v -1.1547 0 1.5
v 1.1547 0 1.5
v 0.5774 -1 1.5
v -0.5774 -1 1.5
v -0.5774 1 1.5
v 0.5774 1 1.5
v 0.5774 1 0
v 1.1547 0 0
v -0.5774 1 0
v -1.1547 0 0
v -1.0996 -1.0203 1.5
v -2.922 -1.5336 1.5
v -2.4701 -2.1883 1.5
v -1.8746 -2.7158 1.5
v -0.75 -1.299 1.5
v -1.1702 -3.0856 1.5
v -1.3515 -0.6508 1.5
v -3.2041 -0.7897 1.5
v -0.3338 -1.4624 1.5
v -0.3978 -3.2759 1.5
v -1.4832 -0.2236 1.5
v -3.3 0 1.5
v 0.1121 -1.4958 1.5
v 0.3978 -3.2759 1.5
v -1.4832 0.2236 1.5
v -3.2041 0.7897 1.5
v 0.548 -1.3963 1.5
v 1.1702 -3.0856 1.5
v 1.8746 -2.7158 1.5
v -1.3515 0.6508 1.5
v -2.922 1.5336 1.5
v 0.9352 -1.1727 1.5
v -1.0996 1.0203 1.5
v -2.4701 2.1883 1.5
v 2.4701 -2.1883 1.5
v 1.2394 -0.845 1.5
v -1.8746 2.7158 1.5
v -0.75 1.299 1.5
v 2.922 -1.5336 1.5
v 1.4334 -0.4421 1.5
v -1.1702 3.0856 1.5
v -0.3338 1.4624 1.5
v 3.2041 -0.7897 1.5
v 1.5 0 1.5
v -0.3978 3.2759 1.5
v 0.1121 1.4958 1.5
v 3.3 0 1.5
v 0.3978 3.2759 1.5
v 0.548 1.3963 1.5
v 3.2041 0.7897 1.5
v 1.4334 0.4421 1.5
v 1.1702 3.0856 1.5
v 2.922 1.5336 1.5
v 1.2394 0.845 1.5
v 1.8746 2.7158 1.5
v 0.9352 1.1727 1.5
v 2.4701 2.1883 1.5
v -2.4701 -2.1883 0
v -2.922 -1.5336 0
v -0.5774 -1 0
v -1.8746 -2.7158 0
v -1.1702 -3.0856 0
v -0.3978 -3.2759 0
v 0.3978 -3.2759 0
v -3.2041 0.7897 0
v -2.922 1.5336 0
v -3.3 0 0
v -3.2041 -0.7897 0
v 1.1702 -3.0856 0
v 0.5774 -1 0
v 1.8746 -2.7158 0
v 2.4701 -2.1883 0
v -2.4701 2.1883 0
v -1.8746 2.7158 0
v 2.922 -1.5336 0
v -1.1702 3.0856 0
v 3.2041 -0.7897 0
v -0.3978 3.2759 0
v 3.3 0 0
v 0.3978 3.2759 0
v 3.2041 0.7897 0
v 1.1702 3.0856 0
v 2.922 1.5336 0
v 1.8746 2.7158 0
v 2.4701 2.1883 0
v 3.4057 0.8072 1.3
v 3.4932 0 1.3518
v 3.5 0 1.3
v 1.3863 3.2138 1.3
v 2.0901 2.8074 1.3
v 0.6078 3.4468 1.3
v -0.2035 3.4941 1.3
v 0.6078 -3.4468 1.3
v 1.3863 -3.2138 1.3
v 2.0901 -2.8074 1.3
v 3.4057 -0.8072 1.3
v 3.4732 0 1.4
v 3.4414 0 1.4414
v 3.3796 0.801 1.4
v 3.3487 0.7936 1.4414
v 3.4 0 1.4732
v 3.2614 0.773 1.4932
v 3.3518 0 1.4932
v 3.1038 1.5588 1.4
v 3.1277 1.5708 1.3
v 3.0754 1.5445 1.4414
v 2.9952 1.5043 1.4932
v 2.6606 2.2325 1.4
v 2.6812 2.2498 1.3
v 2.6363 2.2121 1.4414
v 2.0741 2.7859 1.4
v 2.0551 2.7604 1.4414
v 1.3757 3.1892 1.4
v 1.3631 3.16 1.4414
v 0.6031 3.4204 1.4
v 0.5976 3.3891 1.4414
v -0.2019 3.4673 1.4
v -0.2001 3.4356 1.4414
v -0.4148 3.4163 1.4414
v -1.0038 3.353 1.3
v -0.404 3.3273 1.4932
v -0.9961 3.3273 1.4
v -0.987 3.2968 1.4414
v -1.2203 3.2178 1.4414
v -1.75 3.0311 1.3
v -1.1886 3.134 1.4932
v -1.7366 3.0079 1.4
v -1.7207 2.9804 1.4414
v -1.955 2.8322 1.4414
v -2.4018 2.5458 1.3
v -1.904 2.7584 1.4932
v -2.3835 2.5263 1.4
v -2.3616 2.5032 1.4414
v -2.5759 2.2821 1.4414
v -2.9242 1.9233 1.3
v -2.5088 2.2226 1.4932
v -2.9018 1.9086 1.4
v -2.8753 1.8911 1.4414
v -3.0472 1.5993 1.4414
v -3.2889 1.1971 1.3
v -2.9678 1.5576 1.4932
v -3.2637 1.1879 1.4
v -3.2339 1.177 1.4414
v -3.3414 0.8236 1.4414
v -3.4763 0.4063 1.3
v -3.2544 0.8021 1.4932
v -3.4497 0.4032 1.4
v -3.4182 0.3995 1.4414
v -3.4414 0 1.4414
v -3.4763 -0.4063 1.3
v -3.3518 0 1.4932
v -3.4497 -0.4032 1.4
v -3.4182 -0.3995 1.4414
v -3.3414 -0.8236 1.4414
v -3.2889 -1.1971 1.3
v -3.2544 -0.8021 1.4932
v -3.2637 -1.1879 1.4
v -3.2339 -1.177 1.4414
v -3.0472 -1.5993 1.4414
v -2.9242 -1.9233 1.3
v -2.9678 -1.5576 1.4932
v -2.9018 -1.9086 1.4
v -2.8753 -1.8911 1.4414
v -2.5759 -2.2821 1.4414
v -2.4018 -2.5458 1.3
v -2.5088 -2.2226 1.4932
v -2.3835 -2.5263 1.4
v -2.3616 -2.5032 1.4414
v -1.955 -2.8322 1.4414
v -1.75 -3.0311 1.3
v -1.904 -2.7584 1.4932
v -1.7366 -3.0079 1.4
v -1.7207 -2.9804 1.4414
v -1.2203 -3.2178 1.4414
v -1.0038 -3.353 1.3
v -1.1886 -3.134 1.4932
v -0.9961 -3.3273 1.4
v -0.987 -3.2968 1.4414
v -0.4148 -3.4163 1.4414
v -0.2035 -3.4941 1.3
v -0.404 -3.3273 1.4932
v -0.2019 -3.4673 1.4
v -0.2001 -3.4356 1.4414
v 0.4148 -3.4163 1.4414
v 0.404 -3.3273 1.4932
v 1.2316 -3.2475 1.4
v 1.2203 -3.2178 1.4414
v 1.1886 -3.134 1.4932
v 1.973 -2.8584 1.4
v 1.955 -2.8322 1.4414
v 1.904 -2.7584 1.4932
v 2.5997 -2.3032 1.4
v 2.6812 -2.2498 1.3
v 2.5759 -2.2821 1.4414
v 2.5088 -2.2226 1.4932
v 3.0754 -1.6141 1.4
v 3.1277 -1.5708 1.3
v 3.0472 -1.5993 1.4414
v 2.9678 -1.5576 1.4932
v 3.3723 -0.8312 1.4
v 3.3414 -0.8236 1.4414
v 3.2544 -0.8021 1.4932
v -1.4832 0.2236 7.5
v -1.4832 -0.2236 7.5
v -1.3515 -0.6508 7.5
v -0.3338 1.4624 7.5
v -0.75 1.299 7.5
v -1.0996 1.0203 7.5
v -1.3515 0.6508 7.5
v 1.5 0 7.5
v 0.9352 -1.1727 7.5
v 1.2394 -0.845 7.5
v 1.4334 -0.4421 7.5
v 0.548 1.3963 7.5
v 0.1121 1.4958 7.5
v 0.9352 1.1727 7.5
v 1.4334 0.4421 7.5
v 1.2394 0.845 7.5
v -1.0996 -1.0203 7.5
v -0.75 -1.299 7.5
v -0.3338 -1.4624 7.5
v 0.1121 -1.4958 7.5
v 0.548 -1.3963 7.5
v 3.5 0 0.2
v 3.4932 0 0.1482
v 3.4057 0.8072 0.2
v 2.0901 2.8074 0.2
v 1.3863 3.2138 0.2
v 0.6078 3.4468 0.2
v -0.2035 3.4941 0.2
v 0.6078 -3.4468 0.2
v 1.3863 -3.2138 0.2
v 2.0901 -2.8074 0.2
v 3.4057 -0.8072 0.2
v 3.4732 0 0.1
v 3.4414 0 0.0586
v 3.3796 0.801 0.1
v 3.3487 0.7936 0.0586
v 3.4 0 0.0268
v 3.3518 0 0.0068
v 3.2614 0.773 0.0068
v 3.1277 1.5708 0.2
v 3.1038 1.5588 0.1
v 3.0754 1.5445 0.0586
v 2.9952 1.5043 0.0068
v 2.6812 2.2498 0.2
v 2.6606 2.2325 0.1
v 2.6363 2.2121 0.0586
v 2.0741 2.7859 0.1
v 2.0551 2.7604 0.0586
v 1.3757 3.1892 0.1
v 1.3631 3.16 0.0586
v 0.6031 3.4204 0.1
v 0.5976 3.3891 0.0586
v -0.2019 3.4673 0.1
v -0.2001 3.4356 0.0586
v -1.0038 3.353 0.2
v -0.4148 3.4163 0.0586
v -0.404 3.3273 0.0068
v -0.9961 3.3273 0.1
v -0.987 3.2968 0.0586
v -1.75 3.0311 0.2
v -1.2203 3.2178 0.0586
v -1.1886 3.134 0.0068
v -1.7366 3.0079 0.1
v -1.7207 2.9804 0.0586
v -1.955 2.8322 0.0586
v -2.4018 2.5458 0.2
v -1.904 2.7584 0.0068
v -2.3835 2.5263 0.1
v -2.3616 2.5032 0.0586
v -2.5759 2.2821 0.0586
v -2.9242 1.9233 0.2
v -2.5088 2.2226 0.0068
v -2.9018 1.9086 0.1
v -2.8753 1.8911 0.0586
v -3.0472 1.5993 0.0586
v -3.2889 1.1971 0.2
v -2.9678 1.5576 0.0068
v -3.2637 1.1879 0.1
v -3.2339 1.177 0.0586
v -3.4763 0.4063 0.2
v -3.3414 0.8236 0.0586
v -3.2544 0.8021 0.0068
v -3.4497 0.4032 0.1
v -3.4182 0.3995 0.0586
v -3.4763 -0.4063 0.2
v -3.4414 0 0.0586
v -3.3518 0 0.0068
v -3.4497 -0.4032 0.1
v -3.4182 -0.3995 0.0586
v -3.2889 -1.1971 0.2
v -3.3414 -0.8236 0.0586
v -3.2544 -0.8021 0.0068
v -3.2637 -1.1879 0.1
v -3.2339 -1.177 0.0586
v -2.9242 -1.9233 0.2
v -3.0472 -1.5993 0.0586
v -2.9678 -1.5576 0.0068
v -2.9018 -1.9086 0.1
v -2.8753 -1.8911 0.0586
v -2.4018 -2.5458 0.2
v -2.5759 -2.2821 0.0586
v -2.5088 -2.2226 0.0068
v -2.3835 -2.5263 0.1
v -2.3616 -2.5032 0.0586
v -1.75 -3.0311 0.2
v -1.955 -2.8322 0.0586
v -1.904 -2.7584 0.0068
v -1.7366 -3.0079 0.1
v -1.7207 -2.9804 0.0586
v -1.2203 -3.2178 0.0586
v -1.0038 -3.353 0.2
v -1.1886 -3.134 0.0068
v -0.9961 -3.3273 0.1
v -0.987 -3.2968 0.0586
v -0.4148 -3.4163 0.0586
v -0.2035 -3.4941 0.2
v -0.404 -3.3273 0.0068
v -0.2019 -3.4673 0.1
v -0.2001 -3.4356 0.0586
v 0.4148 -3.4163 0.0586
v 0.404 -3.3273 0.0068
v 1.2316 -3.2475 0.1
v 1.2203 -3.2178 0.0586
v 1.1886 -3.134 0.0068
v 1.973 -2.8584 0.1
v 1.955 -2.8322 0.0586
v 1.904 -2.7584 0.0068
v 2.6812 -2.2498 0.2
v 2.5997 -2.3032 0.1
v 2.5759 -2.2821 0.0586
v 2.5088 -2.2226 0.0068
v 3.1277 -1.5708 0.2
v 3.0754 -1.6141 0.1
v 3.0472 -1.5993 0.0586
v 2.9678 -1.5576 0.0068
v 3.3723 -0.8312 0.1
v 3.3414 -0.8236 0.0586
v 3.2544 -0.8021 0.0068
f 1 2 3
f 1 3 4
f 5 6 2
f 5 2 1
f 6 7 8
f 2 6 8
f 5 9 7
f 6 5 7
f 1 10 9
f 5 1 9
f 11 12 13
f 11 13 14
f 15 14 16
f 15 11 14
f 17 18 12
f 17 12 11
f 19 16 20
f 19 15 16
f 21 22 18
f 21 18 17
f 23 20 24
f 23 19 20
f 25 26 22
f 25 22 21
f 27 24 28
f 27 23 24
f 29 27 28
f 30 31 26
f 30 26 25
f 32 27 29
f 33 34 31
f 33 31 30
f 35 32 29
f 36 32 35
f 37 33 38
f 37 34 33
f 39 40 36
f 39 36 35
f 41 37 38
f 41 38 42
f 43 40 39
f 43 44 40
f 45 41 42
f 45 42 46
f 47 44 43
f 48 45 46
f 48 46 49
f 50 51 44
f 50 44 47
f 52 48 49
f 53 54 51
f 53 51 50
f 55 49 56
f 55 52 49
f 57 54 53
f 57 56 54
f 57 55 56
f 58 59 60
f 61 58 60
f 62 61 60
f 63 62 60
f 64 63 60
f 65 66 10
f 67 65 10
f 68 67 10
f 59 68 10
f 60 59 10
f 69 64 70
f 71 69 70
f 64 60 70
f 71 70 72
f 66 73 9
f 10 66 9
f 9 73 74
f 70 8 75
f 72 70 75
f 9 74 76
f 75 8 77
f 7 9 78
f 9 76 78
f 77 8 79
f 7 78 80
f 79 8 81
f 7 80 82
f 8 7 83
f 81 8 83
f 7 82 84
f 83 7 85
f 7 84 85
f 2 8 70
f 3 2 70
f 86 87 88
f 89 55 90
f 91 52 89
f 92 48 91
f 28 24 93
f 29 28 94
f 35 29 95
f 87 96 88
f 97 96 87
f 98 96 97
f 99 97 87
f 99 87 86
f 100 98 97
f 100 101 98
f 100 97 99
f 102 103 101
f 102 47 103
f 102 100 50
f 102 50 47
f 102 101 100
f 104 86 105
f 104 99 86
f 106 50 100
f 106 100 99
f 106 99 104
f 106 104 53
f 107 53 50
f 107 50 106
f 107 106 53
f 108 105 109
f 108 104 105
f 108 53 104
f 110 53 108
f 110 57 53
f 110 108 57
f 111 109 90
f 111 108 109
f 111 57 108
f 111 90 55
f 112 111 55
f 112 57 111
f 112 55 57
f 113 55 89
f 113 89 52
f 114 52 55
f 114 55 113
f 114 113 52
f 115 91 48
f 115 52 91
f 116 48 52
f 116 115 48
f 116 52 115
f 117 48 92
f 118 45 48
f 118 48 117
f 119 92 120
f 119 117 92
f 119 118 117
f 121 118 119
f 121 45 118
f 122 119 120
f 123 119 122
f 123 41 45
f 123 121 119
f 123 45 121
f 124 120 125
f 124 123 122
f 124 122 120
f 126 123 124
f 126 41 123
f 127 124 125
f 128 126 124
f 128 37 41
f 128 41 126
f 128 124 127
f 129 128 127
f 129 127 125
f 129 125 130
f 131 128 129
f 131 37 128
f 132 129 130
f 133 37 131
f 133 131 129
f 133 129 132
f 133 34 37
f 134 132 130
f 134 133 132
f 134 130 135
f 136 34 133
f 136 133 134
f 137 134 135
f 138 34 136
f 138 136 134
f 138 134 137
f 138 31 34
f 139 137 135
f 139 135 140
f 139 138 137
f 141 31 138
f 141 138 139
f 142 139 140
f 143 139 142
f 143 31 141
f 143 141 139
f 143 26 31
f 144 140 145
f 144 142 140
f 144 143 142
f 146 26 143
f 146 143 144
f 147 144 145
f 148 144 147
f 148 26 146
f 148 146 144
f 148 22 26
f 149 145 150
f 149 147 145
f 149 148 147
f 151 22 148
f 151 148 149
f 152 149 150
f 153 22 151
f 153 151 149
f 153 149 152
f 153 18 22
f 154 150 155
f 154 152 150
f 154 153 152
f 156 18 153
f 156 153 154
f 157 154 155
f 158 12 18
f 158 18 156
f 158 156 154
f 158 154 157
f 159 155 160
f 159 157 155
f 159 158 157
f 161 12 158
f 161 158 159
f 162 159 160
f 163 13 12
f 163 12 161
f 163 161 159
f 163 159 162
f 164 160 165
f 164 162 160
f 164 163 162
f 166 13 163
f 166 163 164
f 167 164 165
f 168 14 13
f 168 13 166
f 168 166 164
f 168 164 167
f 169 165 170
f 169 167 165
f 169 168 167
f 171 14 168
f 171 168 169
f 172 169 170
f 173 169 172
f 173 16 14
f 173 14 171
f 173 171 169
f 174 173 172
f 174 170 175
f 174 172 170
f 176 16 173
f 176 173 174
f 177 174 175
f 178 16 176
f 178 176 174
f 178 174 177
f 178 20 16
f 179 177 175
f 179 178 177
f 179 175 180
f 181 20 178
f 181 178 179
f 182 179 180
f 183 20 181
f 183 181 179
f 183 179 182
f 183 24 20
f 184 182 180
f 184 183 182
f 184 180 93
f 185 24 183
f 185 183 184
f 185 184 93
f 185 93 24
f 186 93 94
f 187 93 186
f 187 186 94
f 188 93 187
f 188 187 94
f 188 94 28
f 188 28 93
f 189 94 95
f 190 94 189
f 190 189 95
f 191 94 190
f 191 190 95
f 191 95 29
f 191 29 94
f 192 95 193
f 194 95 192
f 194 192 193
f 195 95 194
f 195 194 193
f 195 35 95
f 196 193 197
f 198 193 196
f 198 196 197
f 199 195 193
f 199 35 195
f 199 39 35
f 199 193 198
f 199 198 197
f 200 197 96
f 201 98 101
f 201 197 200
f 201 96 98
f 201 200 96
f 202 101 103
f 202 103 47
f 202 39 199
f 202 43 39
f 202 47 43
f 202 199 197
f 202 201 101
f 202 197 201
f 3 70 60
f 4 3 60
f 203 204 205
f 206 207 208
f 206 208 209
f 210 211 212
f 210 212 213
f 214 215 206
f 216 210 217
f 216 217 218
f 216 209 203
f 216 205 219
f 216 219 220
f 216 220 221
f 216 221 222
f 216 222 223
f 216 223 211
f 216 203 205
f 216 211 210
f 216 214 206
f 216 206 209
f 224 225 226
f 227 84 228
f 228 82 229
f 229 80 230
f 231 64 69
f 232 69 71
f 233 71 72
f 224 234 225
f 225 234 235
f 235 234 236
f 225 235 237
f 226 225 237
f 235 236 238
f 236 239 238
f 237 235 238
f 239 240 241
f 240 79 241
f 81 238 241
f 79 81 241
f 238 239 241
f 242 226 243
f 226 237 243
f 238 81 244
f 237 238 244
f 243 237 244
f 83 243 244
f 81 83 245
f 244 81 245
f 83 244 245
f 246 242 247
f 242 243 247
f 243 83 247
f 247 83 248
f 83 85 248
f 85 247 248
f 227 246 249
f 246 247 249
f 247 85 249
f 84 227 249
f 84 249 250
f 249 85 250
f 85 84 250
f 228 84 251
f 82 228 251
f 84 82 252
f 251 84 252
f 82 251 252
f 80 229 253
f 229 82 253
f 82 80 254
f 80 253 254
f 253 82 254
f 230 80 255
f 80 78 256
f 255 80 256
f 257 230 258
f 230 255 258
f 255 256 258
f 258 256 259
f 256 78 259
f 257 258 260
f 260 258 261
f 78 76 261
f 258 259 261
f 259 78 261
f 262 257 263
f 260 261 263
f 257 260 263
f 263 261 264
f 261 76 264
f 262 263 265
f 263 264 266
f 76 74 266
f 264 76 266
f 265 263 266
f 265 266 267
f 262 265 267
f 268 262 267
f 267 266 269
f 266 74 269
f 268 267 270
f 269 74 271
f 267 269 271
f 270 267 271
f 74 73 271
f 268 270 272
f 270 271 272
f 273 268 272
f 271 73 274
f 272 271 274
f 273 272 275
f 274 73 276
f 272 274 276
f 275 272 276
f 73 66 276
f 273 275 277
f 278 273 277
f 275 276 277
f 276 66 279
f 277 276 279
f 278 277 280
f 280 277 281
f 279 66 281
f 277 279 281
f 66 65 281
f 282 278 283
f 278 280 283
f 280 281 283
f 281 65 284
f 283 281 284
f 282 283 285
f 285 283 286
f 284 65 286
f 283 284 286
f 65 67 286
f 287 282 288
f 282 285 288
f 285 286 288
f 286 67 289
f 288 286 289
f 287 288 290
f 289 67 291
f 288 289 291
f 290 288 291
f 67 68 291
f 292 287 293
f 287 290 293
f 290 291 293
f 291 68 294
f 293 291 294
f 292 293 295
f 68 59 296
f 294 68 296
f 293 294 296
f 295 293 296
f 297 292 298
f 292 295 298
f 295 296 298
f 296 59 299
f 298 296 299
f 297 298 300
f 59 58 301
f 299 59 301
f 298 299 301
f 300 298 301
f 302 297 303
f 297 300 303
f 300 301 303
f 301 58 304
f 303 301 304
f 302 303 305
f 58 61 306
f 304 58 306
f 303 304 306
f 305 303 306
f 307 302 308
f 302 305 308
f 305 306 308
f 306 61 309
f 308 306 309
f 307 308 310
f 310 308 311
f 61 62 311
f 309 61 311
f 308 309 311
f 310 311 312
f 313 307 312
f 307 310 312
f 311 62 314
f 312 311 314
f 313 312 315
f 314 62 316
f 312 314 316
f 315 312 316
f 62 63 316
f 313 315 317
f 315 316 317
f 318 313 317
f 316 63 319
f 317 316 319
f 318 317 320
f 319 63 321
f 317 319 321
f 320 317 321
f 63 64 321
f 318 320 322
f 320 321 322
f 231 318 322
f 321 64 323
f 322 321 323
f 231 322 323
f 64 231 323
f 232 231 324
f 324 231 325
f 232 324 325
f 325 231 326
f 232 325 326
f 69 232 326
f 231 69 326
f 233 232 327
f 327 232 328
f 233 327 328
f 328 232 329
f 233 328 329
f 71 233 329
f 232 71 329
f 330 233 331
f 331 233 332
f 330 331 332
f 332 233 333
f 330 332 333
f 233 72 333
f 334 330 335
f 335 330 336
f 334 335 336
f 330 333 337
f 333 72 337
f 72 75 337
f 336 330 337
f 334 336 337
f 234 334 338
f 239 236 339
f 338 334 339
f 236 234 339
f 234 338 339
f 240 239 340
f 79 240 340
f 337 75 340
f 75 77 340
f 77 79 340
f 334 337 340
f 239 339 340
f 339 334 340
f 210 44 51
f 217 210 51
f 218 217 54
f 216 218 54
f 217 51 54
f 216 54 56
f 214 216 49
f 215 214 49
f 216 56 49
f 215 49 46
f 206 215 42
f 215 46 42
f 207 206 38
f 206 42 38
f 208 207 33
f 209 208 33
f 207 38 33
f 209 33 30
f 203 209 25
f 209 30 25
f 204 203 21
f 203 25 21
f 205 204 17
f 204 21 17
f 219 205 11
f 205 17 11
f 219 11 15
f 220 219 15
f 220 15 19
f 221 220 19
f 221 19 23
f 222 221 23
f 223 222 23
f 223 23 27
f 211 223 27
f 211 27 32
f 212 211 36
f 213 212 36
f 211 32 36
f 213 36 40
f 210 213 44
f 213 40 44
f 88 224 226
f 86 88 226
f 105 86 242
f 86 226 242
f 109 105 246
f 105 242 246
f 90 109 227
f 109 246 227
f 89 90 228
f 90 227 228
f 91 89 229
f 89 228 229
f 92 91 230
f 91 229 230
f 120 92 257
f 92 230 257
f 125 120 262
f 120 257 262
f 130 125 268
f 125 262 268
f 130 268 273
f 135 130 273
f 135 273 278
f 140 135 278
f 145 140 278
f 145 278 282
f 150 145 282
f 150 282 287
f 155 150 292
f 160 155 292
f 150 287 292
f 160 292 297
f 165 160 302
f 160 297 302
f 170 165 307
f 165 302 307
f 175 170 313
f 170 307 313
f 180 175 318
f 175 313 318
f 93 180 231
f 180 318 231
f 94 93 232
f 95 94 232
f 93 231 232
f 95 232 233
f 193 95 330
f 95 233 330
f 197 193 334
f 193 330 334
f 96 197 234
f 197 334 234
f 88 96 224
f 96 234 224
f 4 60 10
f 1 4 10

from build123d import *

# Parameters (mm, degrees)
SKETCH_1_R          = 3.5
EXTRUDE_1_DEPTH     = 1.5
SKETCH_2_R          = 1.5
EXTRUDE_2_DEPTH     = 6
FILLET_1_R          = 0.2
CUT_EXTRUDE_1_DEPTH = 1.5


with BuildPart() as part:
    # 草图1 → 凸台-拉伸1 (new body)
    with BuildSketch(Plane.XY):
        Circle(SKETCH_1_R)
    extrude(amount=EXTRUDE_1_DEPTH)

    # 草图2 → 凸台-拉伸2 (add)
    with BuildSketch(Plane.XY.offset(1.5)):
        Circle(SKETCH_2_R)
    extrude(amount=EXTRUDE_2_DEPTH)

    # 圆角1
    fillet_1_edges = [part.edges().sort_by_distance(p)[0] for p in [
        (-3.5, 0, 0),
        (-3.5, 0, 1.5),
    ]]
    fillet(fillet_1_edges, radius=FILLET_1_R)

    # 草图3 → 切除-拉伸1 (cut)
    with BuildSketch(Plane(origin=(0, 0, 0), x_dir=(-1, 0, 0), z_dir=(0, 0, -1))):
        Polygon((1.154700538, 0), (0.577350269, 1), (-0.577350269, 1), (-1.154700538, 0), (-0.577350269, -1), (0.577350269, -1), align=None)
    extrude(amount=-CUT_EXTRUDE_1_DEPTH, mode=Mode.SUBTRACT)


solid = part.part
